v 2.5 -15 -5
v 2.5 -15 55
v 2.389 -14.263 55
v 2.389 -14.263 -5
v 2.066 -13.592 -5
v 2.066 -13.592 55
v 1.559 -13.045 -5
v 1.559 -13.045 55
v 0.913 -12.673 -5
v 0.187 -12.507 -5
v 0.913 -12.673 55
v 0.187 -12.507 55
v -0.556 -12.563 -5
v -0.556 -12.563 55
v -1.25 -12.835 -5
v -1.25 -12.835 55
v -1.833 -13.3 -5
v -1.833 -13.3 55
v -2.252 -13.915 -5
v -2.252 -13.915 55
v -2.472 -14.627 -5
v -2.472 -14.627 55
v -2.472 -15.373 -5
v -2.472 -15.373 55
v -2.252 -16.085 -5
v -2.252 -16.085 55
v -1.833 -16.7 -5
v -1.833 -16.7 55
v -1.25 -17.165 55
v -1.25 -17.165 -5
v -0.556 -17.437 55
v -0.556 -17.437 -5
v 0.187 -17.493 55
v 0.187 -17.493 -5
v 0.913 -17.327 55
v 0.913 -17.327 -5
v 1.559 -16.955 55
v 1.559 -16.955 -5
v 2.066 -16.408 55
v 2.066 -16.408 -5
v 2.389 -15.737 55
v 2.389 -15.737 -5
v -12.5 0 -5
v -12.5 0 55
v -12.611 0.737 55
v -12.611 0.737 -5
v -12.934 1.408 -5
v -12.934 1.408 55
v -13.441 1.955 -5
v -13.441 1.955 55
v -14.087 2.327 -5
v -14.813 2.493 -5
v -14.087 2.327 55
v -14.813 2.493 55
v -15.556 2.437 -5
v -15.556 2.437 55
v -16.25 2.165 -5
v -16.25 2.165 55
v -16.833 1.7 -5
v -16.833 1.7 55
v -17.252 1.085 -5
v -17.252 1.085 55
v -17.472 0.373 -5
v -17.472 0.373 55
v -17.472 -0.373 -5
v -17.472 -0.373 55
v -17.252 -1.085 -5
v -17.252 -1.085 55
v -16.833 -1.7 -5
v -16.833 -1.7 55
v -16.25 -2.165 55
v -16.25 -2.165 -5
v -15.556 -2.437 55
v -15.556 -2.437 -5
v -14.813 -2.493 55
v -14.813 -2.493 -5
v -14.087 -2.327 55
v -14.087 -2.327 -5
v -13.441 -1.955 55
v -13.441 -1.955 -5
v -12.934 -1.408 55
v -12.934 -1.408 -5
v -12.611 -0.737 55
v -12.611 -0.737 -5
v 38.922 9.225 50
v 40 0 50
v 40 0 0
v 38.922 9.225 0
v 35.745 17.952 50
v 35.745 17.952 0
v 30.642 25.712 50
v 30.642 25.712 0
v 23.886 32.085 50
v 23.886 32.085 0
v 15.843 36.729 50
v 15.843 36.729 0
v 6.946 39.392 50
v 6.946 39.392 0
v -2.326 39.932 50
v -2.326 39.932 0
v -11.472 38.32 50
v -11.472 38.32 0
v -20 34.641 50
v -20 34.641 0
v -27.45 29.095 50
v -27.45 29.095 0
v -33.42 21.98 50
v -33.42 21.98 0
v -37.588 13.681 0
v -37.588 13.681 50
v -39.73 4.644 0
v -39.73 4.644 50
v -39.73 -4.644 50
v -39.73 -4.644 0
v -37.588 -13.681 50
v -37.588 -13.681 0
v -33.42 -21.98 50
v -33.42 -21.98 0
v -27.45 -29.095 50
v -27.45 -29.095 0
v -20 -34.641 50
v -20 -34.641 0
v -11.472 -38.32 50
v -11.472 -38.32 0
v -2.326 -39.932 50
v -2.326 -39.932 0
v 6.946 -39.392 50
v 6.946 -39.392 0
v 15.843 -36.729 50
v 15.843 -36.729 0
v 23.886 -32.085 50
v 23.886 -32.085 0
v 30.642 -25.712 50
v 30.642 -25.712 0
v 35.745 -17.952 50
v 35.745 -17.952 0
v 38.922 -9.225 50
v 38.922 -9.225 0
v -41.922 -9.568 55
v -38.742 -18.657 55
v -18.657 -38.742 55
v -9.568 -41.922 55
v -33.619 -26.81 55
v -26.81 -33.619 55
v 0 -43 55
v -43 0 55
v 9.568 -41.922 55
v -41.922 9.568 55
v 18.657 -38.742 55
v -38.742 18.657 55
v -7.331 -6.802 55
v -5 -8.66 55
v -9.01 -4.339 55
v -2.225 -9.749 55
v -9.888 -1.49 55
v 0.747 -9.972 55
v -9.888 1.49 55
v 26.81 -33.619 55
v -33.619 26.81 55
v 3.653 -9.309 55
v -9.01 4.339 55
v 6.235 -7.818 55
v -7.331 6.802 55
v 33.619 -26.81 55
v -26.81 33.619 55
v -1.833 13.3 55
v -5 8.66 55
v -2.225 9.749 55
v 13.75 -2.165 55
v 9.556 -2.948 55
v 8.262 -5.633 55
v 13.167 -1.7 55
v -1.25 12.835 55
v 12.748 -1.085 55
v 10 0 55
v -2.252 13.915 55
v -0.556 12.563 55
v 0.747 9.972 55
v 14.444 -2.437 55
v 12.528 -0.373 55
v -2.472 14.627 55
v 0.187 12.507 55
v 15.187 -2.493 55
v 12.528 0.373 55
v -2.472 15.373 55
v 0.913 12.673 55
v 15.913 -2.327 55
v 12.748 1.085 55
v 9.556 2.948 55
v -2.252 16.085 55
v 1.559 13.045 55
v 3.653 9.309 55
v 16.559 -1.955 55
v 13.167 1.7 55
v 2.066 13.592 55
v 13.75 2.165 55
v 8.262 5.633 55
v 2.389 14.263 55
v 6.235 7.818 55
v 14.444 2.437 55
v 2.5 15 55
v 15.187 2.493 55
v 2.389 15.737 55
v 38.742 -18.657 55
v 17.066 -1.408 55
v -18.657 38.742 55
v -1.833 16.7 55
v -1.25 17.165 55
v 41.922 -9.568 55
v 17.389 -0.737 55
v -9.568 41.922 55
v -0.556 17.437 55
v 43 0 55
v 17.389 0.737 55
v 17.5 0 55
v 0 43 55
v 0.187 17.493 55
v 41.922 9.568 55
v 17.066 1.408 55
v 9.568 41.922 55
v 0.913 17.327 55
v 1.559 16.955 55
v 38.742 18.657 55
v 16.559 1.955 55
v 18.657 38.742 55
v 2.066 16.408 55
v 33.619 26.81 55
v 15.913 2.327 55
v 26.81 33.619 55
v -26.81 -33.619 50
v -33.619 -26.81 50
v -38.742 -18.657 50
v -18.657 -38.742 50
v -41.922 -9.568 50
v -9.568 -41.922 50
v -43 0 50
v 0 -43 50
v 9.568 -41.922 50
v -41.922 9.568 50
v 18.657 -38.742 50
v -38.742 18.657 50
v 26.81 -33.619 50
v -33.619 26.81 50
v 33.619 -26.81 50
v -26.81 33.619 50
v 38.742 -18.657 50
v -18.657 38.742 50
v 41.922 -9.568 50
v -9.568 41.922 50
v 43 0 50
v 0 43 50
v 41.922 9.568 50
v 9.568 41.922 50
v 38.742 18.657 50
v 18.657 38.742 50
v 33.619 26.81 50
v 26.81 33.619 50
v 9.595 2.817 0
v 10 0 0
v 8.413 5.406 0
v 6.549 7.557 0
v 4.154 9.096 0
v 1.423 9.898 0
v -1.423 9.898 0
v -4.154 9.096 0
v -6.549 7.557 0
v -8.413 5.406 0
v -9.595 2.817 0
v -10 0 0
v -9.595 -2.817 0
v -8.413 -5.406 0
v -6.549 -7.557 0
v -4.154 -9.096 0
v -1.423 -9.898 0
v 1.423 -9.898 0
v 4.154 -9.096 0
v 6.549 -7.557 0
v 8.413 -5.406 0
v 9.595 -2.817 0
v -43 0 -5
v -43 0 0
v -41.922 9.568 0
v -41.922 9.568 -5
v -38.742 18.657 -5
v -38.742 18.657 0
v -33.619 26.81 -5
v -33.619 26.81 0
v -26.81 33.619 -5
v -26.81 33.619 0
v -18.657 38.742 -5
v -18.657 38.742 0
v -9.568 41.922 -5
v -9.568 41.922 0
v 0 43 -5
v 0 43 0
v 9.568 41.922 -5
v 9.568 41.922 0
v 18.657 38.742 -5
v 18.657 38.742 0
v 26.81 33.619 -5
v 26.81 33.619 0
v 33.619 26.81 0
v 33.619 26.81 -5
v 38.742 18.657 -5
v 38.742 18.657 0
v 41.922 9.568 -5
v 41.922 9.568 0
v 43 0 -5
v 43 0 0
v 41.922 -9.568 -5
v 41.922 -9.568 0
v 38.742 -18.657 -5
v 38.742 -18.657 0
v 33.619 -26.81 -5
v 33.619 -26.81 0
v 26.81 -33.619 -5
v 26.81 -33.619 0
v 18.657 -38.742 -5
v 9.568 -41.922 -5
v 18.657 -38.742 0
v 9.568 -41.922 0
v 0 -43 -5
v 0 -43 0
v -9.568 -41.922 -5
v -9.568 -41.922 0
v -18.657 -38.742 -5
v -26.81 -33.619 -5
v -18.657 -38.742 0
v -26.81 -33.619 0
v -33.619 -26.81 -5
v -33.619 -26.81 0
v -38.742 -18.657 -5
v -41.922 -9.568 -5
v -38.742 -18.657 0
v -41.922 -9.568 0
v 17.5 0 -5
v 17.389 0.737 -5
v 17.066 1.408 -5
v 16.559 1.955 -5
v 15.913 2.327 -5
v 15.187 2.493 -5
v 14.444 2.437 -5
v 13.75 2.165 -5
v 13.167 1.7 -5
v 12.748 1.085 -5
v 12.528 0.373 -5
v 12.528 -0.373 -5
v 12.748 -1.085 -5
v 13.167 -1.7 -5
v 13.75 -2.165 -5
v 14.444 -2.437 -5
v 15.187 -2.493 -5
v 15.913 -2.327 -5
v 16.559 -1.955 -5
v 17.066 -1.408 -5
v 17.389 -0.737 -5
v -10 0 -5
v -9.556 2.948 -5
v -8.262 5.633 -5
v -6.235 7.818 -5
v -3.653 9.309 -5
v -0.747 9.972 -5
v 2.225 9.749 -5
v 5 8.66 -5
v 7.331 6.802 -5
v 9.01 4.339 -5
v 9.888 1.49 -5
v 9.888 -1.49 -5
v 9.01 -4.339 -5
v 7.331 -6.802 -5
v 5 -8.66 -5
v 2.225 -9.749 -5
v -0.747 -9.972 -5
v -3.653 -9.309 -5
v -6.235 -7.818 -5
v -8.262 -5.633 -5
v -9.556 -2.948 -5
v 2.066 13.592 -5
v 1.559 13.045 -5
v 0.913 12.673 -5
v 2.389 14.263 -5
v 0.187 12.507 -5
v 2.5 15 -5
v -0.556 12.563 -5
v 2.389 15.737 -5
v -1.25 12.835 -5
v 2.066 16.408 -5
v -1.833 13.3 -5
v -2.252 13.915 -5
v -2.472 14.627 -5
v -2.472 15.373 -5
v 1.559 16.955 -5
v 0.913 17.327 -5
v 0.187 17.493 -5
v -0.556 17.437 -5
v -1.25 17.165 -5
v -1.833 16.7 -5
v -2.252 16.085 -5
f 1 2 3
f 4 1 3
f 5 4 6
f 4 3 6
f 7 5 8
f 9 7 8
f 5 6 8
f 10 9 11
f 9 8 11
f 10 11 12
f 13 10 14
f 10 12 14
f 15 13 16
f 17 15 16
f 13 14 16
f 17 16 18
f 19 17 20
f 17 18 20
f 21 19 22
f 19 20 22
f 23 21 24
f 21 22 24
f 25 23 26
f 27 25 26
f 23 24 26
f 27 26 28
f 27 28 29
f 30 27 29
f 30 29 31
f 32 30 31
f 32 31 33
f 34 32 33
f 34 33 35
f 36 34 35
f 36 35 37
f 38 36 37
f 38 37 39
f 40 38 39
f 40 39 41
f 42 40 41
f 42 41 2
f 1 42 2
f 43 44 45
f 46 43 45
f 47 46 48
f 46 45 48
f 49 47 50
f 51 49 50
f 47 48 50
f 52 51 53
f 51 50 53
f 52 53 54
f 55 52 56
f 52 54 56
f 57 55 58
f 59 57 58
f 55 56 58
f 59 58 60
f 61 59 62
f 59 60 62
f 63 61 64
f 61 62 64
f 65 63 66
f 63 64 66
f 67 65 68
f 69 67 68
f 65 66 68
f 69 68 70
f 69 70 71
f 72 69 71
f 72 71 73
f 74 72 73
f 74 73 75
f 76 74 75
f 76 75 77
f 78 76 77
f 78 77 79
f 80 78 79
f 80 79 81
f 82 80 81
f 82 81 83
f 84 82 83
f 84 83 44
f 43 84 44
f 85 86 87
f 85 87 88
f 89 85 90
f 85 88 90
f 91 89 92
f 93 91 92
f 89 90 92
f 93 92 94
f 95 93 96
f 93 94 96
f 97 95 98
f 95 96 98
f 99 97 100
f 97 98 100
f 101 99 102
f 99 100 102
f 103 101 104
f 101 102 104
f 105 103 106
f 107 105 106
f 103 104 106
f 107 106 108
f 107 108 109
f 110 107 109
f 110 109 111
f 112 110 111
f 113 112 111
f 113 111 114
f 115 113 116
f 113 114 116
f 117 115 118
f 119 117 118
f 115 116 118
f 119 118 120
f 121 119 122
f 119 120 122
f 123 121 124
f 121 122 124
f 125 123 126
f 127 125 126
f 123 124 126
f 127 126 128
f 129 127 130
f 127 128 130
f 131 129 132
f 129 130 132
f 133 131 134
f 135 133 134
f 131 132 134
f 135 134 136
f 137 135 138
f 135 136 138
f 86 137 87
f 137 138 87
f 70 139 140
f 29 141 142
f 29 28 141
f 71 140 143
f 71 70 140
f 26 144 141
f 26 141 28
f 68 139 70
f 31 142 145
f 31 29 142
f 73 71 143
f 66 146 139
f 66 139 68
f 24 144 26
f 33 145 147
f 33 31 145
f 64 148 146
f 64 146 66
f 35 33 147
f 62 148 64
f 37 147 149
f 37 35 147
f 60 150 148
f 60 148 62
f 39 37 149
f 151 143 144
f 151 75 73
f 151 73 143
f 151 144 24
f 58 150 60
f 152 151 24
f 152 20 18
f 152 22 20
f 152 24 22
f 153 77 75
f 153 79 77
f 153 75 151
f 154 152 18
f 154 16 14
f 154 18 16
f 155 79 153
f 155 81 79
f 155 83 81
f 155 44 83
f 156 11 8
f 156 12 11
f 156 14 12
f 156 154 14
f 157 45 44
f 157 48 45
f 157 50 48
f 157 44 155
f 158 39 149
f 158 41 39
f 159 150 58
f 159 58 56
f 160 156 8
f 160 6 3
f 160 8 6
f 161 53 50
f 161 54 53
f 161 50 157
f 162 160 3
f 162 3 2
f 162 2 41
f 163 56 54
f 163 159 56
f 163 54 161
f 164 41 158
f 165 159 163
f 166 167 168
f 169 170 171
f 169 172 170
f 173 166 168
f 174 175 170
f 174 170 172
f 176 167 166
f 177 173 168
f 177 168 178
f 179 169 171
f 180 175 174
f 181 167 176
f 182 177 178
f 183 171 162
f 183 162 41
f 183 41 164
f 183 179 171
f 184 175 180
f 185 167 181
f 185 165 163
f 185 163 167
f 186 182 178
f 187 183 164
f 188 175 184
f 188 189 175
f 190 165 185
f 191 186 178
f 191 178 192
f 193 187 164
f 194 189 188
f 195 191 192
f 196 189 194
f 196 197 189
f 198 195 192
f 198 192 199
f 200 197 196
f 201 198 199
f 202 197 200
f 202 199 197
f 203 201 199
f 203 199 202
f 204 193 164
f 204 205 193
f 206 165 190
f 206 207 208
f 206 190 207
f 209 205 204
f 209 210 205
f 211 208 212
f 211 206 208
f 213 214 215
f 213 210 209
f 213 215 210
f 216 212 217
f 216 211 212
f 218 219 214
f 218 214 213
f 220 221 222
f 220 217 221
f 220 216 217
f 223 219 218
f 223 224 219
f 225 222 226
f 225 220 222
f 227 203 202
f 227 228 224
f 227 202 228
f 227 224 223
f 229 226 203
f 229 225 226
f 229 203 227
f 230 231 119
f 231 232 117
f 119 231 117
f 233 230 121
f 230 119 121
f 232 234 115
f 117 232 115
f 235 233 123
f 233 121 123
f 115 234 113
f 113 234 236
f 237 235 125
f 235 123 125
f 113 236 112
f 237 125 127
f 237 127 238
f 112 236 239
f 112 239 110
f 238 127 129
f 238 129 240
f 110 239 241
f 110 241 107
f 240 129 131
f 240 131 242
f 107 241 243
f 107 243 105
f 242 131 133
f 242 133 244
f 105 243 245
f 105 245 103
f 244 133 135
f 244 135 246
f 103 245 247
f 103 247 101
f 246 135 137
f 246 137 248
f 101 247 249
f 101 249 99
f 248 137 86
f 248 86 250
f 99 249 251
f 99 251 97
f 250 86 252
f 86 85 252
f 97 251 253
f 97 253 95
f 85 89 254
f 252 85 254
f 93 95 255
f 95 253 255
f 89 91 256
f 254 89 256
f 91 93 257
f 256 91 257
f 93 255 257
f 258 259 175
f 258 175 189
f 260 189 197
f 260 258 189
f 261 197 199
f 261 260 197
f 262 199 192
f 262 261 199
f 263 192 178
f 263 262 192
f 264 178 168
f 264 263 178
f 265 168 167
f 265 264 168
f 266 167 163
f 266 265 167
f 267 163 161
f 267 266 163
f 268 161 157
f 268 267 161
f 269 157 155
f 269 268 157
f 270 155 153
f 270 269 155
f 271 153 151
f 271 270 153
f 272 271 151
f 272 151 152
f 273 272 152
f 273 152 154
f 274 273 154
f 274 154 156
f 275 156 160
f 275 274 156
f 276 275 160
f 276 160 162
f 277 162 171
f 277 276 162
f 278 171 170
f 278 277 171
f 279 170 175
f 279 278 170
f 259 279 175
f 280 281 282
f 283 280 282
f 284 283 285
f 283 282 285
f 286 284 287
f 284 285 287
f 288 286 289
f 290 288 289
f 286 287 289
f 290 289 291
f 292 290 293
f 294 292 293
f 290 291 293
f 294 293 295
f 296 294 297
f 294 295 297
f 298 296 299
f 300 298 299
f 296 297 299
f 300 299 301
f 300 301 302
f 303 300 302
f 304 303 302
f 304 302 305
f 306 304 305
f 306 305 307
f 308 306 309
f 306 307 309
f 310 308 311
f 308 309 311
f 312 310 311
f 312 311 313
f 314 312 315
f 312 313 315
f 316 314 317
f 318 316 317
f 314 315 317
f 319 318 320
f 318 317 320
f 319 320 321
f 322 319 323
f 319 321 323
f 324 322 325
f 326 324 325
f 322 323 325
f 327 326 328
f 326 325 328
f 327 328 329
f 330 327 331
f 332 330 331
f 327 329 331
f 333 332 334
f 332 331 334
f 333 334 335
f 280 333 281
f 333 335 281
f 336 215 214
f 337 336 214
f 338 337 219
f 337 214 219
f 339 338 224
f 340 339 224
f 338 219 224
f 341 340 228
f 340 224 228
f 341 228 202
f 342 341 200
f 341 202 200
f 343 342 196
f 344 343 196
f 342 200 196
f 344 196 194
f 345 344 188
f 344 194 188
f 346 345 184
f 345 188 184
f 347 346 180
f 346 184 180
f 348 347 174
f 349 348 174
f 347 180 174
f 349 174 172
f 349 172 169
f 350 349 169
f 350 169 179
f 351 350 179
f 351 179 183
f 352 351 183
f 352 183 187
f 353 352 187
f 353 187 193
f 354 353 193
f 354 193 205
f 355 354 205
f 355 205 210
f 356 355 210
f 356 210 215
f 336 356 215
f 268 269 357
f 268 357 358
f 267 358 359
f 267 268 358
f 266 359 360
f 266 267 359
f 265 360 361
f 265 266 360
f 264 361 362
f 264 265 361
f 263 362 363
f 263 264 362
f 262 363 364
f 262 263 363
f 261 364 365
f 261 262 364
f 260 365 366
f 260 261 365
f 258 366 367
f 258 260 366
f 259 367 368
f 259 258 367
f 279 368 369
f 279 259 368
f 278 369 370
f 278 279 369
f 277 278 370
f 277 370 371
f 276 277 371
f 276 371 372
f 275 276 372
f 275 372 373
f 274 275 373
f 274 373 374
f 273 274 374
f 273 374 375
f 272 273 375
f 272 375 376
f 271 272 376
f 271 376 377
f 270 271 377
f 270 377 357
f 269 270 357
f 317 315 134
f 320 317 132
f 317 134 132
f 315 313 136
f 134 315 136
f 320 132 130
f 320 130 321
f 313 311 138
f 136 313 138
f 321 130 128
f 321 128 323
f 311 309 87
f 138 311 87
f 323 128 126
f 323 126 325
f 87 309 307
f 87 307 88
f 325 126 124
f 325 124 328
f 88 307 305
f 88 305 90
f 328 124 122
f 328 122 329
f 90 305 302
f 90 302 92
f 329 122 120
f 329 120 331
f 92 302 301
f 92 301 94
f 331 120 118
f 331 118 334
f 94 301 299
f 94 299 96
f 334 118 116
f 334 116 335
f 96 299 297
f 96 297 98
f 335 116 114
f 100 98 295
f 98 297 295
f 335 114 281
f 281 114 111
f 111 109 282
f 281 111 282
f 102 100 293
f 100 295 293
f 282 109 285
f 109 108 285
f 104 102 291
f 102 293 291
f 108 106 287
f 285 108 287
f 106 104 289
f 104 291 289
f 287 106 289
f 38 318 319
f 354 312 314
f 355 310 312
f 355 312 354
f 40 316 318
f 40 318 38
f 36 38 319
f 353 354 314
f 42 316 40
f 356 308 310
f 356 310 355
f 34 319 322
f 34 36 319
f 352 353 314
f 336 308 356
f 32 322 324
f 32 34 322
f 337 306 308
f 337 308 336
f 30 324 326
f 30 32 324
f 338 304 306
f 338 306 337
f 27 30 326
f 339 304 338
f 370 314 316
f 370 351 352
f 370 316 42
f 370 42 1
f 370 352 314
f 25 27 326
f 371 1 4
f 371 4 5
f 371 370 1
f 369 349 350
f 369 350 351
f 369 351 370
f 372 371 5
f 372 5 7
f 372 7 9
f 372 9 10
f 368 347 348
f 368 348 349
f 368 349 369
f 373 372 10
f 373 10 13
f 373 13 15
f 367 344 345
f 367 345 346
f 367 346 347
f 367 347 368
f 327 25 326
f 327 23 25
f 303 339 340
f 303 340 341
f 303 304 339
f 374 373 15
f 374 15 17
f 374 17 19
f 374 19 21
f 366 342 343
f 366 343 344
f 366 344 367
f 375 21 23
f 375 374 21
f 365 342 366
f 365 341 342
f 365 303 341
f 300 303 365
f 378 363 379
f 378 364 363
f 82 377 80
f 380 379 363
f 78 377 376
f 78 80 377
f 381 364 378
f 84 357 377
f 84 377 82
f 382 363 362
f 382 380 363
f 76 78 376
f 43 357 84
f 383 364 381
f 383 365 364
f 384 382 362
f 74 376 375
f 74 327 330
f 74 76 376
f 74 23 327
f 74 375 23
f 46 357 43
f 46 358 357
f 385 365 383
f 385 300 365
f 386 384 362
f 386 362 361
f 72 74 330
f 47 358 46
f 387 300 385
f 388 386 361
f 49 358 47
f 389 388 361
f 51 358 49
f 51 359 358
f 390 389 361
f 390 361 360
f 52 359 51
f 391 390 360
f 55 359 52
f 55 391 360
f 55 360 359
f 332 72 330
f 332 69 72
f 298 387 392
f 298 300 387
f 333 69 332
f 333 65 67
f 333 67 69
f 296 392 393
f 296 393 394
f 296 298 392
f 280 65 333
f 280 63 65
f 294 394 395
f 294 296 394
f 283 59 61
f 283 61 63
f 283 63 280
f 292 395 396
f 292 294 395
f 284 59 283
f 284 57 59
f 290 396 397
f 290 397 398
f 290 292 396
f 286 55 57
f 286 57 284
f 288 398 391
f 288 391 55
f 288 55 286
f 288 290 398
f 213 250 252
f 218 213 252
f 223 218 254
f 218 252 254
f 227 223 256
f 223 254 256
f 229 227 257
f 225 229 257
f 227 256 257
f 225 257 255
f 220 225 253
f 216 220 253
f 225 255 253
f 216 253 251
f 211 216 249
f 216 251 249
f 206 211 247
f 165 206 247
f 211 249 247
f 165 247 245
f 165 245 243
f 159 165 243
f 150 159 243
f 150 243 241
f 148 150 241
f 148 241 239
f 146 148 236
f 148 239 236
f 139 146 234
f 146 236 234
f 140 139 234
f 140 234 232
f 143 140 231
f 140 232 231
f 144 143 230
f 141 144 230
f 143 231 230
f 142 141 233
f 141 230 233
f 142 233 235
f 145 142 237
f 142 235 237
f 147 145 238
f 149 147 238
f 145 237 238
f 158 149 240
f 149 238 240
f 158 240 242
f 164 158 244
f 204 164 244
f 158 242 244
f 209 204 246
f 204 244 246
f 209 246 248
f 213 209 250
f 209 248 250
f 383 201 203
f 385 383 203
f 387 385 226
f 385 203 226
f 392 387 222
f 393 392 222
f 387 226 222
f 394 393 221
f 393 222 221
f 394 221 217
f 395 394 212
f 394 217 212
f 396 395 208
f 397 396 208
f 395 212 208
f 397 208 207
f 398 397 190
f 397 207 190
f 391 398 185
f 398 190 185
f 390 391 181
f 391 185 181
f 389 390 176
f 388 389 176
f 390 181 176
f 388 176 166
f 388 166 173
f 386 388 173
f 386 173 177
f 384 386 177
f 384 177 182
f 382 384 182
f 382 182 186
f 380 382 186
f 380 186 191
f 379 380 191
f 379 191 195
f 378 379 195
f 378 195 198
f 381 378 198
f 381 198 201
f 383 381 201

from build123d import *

# Parameters (mm, degrees)
SKETCH1_R           = 40
SKETCH1_R_2         = 10
BOSS_EXTRUDE1_DEPTH = 50
SKETCH2_R           = 43
SKETCH2_R_2         = 10
BOSS_EXTRUDE2_DEPTH = 5
SKETCH3_R           = 43
SKETCH3_R_2         = 10
BOSS_EXTRUDE3_DEPTH = 5
SKETCH4_R           = 2.5
CUT_EXTRUDE1_DEPTH  = 61


with BuildPart() as part:
    # Sketch1 → Boss-Extrude1 (new body)
    with BuildSketch(Plane.XY):
        Circle(SKETCH1_R)
        Circle(SKETCH1_R_2, mode=Mode.SUBTRACT)
    extrude(amount=BOSS_EXTRUDE1_DEPTH)

    # Sketch2 → Boss-Extrude2 (add)
    with BuildSketch(Plane.XY.offset(50)):
        Circle(SKETCH2_R)
        Circle(SKETCH2_R_2, mode=Mode.SUBTRACT)
    extrude(amount=BOSS_EXTRUDE2_DEPTH)

    # Sketch3 → Boss-Extrude3 (add)
    with BuildSketch(Plane(origin=(0, 0, 0), x_dir=(-1, 0, 0), z_dir=(0, 0, -1))):
        Circle(SKETCH3_R)
        Circle(SKETCH3_R_2, mode=Mode.SUBTRACT)
    extrude(amount=BOSS_EXTRUDE3_DEPTH)

    # Sketch4 → Cut-Extrude1 (cut, through all)
    with BuildSketch(Plane.XY.offset(55)):
        with Locations((0, 15)):
            Circle(SKETCH4_R)
        with Locations((15, 0)):
            Circle(SKETCH4_R)
        with Locations((0, -15)):
            Circle(SKETCH4_R)
        with Locations((-15, 0)):
            Circle(SKETCH4_R)
    extrude(amount=-CUT_EXTRUDE1_DEPTH, mode=Mode.SUBTRACT)


solid = part.part
